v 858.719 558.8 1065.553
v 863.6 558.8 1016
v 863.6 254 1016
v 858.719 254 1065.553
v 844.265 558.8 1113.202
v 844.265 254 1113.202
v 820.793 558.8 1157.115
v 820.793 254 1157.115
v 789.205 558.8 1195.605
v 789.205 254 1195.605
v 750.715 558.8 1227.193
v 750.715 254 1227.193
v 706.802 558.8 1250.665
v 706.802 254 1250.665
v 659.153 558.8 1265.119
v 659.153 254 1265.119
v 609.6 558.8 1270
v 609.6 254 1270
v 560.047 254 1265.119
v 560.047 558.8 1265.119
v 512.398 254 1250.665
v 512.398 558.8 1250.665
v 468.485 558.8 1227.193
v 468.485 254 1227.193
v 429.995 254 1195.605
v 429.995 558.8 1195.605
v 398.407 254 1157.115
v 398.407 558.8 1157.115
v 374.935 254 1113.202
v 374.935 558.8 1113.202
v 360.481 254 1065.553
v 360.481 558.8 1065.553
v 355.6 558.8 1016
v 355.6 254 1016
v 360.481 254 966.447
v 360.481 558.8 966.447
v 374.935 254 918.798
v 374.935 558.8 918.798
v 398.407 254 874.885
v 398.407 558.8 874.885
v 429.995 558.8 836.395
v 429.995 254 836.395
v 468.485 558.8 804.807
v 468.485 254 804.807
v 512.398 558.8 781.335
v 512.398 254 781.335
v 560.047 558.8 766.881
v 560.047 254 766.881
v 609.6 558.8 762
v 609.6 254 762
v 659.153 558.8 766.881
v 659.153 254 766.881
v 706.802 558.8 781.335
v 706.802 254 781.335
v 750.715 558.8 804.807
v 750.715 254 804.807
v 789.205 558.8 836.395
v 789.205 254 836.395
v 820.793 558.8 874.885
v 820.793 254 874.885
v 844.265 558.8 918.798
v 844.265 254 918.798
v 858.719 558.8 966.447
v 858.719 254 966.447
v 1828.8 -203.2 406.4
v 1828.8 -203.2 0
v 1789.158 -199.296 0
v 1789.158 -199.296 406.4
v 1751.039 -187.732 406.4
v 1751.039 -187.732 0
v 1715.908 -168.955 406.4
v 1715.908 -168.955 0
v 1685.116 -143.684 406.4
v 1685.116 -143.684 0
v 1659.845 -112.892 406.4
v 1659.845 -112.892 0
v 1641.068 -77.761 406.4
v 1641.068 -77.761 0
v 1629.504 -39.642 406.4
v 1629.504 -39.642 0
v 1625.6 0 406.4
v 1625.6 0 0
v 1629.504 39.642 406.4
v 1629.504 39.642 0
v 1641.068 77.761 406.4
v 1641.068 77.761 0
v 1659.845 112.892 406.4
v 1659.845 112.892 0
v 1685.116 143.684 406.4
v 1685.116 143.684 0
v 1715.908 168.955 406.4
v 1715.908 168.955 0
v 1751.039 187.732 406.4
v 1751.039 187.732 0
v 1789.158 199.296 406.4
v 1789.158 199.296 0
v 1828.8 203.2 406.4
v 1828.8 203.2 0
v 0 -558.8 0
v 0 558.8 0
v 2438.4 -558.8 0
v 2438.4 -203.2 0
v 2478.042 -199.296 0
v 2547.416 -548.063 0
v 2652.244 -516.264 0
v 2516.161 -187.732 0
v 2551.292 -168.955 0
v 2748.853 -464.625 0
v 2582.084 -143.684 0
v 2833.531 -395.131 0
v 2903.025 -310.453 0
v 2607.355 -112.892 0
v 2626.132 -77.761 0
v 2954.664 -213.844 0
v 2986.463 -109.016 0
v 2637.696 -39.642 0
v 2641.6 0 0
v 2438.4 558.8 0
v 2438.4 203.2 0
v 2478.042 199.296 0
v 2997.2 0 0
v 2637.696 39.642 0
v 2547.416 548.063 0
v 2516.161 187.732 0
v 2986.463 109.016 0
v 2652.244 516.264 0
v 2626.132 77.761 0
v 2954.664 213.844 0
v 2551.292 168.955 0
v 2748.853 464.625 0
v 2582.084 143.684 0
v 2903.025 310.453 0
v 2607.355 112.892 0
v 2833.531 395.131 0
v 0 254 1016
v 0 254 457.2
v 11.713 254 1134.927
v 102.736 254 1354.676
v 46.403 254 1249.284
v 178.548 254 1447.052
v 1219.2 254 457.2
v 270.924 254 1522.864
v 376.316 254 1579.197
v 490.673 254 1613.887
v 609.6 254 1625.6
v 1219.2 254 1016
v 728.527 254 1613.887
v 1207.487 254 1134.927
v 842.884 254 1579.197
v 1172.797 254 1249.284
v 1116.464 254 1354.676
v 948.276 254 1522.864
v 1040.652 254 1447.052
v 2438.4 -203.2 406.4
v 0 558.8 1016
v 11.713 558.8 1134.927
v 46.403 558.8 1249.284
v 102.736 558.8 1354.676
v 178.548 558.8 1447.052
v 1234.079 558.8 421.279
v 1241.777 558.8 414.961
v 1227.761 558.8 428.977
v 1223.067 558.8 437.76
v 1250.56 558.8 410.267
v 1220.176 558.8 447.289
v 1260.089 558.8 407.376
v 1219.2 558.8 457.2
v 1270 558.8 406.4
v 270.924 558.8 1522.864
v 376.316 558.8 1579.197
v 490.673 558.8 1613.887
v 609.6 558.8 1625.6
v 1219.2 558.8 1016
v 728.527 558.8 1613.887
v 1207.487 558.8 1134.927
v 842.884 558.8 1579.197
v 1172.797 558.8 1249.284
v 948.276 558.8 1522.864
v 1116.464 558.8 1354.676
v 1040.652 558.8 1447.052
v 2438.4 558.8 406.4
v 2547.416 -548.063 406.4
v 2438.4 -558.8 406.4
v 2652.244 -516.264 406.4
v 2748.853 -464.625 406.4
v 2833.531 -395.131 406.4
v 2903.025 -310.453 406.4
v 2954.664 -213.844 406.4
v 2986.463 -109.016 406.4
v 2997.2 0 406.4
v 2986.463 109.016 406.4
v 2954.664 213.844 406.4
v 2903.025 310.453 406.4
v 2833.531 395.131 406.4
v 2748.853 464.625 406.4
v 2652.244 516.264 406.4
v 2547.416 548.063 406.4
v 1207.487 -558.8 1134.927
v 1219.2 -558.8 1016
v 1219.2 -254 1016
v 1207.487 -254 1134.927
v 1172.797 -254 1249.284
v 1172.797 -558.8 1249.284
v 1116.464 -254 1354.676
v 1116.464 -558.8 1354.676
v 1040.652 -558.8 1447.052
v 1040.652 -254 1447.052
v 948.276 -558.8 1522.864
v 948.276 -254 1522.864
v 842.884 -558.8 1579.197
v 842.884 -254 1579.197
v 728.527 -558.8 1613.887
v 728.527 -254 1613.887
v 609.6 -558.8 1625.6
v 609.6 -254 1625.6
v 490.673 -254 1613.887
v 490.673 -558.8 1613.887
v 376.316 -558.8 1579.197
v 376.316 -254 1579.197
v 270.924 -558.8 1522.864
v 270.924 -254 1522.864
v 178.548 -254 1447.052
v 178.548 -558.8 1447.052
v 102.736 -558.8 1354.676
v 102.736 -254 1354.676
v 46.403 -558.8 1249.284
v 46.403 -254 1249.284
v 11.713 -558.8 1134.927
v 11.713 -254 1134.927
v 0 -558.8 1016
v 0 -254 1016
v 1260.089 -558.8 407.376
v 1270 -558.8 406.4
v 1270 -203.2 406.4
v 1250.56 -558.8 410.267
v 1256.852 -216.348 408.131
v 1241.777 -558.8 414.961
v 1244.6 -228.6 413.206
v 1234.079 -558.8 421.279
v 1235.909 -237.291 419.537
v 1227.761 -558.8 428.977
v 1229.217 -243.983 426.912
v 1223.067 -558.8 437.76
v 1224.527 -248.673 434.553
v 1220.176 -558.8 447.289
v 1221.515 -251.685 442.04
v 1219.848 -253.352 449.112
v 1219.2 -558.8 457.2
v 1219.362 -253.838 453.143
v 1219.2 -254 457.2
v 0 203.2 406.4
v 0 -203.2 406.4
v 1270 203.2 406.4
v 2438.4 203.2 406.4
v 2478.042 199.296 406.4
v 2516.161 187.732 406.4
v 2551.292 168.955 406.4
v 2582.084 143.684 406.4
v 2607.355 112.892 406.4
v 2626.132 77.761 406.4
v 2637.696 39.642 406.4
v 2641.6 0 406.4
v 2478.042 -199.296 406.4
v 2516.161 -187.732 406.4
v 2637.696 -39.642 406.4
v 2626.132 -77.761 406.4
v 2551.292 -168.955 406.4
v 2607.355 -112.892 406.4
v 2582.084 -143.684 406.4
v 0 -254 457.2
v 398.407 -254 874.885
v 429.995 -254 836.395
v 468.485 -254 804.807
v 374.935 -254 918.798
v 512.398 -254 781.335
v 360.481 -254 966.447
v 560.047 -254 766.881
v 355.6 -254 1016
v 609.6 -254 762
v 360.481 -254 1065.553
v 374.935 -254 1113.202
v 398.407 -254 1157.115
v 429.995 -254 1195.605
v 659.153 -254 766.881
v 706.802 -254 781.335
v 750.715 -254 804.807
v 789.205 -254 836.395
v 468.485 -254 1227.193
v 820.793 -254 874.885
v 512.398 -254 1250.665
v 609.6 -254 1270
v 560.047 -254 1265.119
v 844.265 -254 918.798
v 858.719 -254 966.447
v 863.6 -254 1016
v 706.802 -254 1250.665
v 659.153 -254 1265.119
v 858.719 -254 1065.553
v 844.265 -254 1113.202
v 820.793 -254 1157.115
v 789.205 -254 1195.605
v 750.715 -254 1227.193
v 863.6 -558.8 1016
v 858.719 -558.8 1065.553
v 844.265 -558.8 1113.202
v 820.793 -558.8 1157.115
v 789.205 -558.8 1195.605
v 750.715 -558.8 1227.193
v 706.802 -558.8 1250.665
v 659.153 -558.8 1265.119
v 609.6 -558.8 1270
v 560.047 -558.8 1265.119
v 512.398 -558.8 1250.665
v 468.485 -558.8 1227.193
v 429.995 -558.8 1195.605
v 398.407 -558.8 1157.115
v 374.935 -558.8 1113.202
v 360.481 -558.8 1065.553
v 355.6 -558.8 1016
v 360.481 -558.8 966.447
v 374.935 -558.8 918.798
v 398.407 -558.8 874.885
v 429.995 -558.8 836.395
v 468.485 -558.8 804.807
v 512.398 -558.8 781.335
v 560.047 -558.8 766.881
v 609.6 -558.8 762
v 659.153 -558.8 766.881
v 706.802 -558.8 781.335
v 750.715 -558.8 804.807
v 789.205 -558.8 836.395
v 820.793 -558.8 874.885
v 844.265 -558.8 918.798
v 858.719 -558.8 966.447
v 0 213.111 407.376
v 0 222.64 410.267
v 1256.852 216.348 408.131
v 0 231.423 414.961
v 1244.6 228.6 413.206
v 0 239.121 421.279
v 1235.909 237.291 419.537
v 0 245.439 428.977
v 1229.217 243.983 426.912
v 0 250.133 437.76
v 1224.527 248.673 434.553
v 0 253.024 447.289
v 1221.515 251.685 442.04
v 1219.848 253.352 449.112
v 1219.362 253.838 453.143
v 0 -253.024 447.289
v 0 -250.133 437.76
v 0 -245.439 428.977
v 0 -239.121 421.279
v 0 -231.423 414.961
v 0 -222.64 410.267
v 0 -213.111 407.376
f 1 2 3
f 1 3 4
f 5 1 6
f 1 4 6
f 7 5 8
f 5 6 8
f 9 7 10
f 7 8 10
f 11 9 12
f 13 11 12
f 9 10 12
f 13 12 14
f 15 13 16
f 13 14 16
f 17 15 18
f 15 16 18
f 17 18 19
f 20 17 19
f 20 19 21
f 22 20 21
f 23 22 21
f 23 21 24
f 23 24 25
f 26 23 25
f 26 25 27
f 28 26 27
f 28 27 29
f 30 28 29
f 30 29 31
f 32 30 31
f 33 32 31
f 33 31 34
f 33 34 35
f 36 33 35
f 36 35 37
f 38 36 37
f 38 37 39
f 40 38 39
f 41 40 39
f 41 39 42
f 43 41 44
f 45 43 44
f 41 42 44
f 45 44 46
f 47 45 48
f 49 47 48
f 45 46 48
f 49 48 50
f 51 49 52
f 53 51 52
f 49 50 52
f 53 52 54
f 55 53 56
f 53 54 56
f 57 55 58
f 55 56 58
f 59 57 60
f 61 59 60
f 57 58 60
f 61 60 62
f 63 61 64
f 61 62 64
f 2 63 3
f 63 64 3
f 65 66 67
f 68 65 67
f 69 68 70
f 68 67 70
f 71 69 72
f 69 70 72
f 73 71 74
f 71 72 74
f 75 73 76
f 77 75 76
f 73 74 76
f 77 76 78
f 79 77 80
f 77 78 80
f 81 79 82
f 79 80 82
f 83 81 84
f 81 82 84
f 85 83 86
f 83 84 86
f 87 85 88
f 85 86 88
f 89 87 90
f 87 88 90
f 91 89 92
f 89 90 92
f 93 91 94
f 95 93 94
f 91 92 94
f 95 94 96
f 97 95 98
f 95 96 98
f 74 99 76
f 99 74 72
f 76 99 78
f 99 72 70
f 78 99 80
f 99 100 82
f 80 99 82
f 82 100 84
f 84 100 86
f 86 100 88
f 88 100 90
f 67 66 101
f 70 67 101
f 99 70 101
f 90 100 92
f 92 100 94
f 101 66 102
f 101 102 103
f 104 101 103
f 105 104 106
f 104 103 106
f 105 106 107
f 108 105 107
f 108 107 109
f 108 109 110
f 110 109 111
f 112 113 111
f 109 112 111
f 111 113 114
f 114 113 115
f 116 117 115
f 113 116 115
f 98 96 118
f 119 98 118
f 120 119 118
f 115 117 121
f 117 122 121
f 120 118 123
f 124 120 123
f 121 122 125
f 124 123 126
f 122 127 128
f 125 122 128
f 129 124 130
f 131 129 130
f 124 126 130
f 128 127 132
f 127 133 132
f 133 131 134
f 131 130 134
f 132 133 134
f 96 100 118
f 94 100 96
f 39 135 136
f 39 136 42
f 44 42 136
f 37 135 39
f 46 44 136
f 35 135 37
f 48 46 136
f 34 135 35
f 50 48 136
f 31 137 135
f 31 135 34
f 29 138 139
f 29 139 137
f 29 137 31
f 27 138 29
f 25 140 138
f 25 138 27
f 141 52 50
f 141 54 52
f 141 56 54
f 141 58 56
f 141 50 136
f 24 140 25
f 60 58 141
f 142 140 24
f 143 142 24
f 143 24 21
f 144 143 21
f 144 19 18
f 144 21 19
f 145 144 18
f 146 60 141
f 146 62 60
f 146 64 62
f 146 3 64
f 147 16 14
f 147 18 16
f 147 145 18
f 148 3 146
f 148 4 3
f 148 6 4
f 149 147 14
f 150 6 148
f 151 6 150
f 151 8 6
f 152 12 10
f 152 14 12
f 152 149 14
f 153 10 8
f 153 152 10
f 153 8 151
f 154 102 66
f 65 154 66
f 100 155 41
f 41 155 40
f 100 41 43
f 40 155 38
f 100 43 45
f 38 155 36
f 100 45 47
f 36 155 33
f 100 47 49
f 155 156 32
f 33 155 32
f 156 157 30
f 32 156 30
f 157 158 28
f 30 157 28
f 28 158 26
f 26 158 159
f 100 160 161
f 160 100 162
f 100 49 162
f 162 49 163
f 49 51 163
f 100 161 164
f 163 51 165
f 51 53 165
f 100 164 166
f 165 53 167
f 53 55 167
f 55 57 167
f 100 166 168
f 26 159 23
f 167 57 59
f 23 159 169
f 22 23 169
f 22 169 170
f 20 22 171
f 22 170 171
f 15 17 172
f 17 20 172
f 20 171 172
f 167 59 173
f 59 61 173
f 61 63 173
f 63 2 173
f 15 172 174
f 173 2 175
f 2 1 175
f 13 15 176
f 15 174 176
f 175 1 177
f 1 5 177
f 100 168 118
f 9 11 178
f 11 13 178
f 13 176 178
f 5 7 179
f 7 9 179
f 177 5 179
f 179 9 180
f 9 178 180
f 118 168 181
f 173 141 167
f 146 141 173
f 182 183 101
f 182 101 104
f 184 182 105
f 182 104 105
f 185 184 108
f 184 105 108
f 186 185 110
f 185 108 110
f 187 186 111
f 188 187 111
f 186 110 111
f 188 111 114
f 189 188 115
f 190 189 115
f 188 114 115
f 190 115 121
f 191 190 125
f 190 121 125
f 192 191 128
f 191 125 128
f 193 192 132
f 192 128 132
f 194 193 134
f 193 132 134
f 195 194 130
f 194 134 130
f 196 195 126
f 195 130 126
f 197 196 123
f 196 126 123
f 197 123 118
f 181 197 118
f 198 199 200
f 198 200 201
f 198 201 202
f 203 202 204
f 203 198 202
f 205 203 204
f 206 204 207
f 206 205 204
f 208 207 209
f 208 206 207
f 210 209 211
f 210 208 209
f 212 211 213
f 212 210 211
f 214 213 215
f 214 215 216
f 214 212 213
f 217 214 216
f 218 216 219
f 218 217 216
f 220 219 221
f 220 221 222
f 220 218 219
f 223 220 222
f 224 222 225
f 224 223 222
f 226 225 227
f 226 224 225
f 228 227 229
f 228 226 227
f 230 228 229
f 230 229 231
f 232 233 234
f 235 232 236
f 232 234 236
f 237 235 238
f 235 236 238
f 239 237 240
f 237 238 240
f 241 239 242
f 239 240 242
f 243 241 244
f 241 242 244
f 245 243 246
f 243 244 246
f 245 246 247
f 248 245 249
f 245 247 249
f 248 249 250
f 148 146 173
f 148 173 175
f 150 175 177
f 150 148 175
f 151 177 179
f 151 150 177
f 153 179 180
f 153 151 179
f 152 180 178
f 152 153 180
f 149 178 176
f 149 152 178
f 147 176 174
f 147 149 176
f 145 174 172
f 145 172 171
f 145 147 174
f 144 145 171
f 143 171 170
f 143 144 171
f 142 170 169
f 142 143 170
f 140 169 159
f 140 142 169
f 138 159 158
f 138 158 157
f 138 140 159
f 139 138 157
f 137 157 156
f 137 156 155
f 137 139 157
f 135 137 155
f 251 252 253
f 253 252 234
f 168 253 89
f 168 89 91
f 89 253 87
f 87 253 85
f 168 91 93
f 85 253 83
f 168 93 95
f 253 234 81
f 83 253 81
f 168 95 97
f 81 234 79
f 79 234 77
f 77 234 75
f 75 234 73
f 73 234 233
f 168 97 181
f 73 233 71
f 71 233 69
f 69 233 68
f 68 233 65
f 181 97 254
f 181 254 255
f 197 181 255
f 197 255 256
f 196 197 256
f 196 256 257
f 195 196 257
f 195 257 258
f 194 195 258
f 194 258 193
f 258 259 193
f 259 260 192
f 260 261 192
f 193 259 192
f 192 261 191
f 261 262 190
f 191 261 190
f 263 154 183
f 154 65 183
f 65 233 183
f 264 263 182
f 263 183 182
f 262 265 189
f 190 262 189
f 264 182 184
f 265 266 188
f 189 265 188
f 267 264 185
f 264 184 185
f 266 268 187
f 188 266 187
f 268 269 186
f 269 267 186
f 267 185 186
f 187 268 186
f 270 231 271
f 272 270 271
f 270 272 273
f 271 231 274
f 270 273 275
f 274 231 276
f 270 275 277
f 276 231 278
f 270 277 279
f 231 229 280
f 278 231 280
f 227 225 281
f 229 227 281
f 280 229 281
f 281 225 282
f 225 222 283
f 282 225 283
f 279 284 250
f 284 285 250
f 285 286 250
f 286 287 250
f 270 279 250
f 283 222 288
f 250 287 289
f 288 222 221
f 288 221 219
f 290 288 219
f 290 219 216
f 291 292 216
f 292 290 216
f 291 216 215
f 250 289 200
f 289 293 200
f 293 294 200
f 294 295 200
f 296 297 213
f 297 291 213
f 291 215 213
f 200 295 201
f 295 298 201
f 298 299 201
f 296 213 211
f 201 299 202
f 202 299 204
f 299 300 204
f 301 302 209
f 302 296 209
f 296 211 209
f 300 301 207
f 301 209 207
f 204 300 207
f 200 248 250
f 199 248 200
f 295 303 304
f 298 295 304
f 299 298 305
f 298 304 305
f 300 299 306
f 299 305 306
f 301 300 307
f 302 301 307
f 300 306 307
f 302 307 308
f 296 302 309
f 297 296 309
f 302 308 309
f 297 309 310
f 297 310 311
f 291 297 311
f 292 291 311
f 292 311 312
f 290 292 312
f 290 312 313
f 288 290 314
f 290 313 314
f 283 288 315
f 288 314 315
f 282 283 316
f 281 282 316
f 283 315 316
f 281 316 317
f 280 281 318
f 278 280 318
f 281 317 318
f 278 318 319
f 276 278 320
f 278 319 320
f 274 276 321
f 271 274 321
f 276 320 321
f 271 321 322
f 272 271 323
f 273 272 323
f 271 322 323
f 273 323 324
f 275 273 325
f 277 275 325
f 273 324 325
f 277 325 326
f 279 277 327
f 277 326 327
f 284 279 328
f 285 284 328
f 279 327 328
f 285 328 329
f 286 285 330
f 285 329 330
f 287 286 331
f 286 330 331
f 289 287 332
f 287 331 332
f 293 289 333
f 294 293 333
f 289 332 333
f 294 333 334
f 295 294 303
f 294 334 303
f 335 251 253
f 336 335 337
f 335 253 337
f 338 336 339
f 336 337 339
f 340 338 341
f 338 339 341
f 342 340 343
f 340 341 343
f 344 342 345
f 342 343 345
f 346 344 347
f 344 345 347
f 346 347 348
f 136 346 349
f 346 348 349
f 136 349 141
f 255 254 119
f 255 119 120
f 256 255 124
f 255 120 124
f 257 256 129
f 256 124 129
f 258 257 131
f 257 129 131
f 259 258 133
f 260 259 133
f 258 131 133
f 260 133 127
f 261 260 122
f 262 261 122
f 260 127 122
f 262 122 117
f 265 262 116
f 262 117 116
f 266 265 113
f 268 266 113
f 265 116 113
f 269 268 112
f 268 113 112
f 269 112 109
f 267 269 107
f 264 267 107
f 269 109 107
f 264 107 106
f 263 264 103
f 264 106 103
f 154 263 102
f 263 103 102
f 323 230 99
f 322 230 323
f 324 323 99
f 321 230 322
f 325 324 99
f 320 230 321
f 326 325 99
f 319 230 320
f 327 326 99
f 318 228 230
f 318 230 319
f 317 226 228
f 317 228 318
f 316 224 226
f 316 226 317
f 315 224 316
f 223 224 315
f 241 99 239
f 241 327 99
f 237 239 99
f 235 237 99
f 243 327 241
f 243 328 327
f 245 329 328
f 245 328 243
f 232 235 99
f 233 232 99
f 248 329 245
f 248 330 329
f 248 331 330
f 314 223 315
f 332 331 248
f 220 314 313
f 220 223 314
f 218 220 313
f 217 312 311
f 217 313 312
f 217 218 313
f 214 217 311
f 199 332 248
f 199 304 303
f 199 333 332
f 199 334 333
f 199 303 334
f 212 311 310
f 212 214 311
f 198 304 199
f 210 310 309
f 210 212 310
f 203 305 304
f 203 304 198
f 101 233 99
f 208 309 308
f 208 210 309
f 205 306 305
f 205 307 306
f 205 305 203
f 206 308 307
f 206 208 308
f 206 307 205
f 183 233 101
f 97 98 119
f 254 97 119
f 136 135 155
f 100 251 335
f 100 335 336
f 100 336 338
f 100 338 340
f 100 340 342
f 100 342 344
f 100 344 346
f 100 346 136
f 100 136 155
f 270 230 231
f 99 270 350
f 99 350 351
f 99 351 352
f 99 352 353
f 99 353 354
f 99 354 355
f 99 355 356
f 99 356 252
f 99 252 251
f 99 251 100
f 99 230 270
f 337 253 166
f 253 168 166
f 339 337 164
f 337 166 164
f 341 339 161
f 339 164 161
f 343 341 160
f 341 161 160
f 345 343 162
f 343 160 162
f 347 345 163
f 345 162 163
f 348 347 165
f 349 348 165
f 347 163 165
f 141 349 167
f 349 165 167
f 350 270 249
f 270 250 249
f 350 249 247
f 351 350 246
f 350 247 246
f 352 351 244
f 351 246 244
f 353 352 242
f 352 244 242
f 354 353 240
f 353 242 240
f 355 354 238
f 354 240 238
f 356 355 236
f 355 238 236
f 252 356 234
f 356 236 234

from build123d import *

# Parameters (mm, degrees)
F1_DEPTH = 406.4
F2_R     = 254
F3_DEPTH = 1117.6
F4_DEPTH = 812.8
F5_DEPTH = 304.8
F6_R     = 50.8


with BuildPart() as f1:
    # F0 (on Top) → F1 (new body)
    with BuildSketch(Plane.XY):
        with BuildLine():
            Line((0, 558.8), (0, -558.8))
            Line((0, -558.8), (2438.4, -558.8))
            ThreePointArc((2438.4, -558.8), (2997.2, 0), (2438.4, 558.8))
            Line((2438.4, 558.8), (0, 558.8))
        make_face()
        with BuildLine():
            Line((1828.8, 203.2), (2438.4, 203.2))
            ThreePointArc((2438.4, 203.2), (2641.6, 0), (2438.4, -203.2))
            Line((2438.4, -203.2), (1828.8, -203.2))
            ThreePointArc((1828.8, -203.2), (1625.6, 0), (1828.8, 203.2))
        make_face(mode=Mode.SUBTRACT)
    extrude(amount=F1_DEPTH)

    # F2 (on face) → F3 (join)
    with BuildSketch(Plane.XZ.offset(558.8)):
        with BuildLine():
            ThreePointArc((1219.2, 1016), (609.6, 1625.6), (0, 1016))
            Line((0, 1016), (0, 406.4))
            Line((0, 406.4), (1219.2, 406.4))
            Line((1219.2, 406.4), (1219.2, 1016))
        make_face()
        with Locations((609.6, 1016)):
            Circle(F2_R, mode=Mode.SUBTRACT)
    extrude(amount=-F3_DEPTH)

    # F2 (on face) → F4 (cut)
    with BuildSketch(Plane.XZ.offset(558.8)):
        with BuildLine():
            ThreePointArc((1219.2, 1016), (609.6, 1625.6), (0, 1016))
            Line((0, 1016), (0, 406.4))
            Line((0, 406.4), (1219.2, 406.4))
            Line((1219.2, 406.4), (1219.2, 1016))
        make_face()
        with Locations((609.6, 1016)):
            Circle(F2_R, mode=Mode.SUBTRACT)
    extrude(amount=-F4_DEPTH, mode=Mode.SUBTRACT)

    # F2 (on face) → F5 (join)
    with BuildSketch(Plane.XZ.offset(558.8)):
        with BuildLine():
            ThreePointArc((1219.2, 1016), (609.6, 1625.6), (0, 1016))
            Line((0, 1016), (0, 406.4))
            Line((0, 406.4), (1219.2, 406.4))
            Line((1219.2, 406.4), (1219.2, 1016))
        make_face()
        with Locations((609.6, 1016)):
            Circle(F2_R, mode=Mode.SUBTRACT)
    extrude(amount=-F5_DEPTH)

    # F6
    f6_edges = [f1.edges().sort_by_distance(p)[0] for p in [
        (1219.2, -406.4, 406.4),
        (1219.2, 406.4, 406.4),
        (609.6, -254, 406.4),
        (609.6, 254, 406.4),
    ]]
    fillet(f6_edges, radius=F6_R)


solid = f1.part
